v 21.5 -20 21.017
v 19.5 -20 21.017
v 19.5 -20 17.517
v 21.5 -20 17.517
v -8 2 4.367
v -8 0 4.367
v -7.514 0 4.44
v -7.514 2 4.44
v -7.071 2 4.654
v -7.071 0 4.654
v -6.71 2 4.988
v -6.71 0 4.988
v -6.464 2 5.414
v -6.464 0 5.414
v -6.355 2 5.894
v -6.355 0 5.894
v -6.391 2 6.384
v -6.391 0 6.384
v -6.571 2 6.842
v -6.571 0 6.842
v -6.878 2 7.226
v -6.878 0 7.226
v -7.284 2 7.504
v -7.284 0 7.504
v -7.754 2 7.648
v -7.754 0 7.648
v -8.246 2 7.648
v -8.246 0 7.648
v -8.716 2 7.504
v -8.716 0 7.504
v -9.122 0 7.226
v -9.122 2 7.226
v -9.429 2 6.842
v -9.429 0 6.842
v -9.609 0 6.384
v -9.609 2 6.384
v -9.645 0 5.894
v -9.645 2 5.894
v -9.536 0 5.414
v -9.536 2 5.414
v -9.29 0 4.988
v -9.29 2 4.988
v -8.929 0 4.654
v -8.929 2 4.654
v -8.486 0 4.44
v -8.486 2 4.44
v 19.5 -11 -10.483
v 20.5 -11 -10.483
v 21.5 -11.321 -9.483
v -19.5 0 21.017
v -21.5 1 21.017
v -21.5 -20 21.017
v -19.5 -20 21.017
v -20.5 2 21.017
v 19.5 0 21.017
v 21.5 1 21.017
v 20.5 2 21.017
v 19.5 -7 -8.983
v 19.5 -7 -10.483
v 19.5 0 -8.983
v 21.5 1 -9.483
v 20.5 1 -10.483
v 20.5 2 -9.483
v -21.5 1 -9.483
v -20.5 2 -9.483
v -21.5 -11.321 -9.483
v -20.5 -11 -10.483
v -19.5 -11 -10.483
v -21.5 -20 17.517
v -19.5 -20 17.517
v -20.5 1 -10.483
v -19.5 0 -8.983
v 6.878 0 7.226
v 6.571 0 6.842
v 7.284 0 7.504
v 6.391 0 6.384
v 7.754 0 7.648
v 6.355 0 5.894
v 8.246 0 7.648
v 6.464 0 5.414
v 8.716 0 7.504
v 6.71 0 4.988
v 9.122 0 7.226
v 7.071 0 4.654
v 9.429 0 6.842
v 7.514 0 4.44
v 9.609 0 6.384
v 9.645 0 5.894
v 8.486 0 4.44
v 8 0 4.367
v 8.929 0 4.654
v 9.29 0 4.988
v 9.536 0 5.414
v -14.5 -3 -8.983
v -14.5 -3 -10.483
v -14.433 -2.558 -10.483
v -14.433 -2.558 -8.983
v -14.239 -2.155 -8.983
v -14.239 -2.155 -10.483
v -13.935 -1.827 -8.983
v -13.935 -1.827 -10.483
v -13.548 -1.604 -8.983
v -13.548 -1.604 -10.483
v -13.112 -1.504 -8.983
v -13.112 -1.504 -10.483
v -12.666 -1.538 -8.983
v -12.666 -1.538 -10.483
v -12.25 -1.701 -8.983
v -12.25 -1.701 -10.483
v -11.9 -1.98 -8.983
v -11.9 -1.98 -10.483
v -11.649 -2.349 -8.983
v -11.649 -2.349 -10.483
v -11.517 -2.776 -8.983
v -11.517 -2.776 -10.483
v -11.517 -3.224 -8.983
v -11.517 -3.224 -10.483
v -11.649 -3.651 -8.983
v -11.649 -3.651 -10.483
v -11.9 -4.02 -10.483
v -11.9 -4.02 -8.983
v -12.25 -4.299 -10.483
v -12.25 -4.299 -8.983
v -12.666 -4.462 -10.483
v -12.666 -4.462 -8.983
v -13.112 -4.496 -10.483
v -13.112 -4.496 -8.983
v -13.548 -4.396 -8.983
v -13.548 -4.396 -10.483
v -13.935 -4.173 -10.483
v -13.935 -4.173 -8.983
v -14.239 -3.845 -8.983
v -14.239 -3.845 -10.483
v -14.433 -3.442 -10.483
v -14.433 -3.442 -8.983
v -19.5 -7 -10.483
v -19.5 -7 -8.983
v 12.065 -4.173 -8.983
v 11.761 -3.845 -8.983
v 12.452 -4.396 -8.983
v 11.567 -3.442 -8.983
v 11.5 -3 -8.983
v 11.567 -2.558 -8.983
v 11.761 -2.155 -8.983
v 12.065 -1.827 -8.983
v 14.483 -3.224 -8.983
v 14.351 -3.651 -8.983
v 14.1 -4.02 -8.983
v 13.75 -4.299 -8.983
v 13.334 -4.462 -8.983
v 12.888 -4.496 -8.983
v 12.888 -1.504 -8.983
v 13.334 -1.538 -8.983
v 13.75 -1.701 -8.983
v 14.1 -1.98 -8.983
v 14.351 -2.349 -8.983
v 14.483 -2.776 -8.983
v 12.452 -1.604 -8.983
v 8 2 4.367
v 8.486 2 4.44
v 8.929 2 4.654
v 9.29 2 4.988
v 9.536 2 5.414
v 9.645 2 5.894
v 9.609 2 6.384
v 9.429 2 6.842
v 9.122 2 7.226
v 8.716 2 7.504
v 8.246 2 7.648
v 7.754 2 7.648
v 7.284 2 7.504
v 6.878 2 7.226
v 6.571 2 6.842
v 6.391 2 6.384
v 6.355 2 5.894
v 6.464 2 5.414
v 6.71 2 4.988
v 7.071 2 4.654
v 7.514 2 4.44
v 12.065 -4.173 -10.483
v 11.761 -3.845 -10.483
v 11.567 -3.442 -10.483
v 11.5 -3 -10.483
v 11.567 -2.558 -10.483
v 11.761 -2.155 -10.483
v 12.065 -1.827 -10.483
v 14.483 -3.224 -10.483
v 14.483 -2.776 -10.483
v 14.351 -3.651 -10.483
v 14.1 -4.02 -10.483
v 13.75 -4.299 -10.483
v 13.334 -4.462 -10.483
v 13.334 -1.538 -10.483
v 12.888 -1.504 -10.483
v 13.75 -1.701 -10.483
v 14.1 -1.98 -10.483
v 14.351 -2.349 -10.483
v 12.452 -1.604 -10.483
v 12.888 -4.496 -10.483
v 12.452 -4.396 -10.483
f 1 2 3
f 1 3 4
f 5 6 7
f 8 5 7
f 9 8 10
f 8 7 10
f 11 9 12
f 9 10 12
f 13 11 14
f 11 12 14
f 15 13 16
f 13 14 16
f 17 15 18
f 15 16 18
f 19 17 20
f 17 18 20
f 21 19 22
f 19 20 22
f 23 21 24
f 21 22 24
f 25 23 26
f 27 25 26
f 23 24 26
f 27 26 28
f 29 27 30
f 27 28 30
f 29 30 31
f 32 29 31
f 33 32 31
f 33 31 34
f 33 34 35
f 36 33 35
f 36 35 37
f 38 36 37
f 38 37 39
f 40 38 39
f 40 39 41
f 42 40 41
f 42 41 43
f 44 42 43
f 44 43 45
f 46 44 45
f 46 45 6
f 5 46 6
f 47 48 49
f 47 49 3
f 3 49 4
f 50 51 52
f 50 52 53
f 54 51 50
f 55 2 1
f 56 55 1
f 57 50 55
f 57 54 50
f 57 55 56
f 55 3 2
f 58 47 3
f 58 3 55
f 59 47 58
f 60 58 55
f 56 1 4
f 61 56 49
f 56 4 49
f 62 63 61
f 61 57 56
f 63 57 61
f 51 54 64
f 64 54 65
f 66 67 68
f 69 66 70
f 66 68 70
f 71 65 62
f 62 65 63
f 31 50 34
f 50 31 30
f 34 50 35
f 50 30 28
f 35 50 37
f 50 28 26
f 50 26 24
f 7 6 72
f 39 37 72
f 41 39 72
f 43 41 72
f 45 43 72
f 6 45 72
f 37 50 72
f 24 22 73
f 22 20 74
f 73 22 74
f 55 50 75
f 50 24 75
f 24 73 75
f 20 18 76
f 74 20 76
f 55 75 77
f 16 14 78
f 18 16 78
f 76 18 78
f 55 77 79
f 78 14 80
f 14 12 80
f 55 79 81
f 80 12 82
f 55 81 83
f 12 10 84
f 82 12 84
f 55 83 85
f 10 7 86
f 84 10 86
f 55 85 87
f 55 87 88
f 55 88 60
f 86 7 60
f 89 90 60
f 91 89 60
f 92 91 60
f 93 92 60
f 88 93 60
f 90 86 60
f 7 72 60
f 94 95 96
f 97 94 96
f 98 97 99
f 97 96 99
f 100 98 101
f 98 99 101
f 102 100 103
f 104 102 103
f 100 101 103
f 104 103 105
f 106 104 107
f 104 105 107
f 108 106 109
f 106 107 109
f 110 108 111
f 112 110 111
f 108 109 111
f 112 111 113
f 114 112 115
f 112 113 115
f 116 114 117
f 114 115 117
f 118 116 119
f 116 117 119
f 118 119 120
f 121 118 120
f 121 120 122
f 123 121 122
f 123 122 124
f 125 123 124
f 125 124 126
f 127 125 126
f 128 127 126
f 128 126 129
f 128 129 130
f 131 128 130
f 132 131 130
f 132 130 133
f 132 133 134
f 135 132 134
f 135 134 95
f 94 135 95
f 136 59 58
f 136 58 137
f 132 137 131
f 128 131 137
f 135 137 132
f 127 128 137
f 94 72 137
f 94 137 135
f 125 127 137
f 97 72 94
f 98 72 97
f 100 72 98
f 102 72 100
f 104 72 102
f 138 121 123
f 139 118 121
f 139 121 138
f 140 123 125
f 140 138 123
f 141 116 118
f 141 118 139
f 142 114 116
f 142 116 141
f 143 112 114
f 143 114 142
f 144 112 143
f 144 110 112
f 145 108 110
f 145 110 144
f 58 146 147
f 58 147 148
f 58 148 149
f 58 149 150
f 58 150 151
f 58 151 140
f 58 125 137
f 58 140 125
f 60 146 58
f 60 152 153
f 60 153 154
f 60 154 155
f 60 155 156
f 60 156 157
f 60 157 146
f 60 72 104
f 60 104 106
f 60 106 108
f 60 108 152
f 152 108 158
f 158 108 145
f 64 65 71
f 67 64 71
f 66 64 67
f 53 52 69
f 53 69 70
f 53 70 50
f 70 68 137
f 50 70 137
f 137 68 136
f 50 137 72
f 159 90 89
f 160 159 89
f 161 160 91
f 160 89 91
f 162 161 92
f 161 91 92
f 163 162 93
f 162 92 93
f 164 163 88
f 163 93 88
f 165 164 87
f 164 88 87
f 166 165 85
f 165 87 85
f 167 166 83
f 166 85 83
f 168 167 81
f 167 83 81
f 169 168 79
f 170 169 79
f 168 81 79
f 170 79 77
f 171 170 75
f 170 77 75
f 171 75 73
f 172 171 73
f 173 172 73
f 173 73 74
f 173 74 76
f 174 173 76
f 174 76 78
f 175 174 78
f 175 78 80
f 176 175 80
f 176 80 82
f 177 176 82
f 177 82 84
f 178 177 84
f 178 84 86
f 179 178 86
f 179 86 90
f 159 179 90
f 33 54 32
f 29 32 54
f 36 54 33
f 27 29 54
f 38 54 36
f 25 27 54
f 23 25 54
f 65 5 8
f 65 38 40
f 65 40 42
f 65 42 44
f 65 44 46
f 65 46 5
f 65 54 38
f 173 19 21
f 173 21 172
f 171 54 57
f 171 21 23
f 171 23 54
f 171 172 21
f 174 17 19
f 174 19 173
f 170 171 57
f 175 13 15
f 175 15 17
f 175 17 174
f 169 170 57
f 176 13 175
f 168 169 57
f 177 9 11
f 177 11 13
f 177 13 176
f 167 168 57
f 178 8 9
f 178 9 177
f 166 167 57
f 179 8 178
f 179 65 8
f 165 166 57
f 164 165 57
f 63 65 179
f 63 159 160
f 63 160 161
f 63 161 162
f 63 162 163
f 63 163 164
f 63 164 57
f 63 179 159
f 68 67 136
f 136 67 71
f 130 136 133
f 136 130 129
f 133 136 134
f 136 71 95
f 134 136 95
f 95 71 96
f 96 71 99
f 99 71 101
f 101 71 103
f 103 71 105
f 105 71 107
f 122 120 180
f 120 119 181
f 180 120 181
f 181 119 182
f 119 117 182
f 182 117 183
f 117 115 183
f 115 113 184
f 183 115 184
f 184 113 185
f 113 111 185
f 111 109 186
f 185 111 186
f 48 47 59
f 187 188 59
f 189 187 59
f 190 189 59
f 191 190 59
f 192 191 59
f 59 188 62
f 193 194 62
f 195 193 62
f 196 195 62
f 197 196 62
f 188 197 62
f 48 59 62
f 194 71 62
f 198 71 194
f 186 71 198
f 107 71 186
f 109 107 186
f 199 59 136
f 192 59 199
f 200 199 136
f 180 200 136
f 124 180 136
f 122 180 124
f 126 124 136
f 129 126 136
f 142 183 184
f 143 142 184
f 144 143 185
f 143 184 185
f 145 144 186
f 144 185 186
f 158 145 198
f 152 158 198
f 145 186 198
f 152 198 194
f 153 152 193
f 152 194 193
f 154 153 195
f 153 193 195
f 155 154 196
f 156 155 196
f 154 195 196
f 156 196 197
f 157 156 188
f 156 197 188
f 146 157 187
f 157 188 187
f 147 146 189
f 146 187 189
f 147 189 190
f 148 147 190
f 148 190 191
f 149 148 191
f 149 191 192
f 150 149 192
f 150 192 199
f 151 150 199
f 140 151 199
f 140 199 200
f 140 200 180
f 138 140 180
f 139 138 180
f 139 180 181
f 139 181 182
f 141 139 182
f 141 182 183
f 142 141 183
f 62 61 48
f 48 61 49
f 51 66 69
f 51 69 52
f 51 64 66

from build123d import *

# Parameters (mm, degrees)
SKETCH_1_W          = 43
SKETCH_1_H          = 31.5
EXTRUDE_1_DEPTH     = 2
SKETCH_4_W          = 2
SKETCH_4_H          = 31.5
EXTRUDE_3_DEPTH     = 20
SKETCH_7_W          = 39
SKETCH_7_H          = 1.5
EXTRUDE_4_DEPTH     = 11
SKETCH_6_R          = 1.65
CUT_EXTRUDE_2_DEPTH = 12
SKETCH_5_R          = 1.5
CUT_EXTRUDE_1_DEPTH = 12
CHAMFER_1_SIZE      = 1
CUT_EXTRUDE_4_DEPTH = 50
SKETCH_13_W         = 39
SKETCH_13_H         = 4
CUT_EXTRUDE_8_DEPTH = 10


with BuildPart() as part:
    # 草图1 → 凸台-拉伸1 (new body)
    with BuildSketch(Plane(origin=(0, 0, 0), x_dir=(1, 0, 0), z_dir=(0, 1, 0))):
        with Locations((0, -5.266908213)):
            Rectangle(SKETCH_1_W, SKETCH_1_H)
    extrude(amount=EXTRUDE_1_DEPTH)

    # 草图4 → 凸台-拉伸3 (add)
    with BuildSketch(Plane.XZ):
        with Locations((-20.5, 5.266908213)):
            Rectangle(SKETCH_4_W, SKETCH_4_H)
        with Locations((20.5, 5.266908213)):
            Rectangle(SKETCH_4_W, SKETCH_4_H)
    extrude(amount=EXTRUDE_3_DEPTH)

    # 草图7 → 凸台-拉伸4 (add)
    with BuildSketch(Plane.XZ):
        with Locations((0, -9.733091787)):
            Rectangle(SKETCH_7_W, SKETCH_7_H)
    extrude(amount=EXTRUDE_4_DEPTH)

    # 草图6 → 切除-拉伸2 (cut)
    with BuildSketch(Plane.XZ):
        with Locations(Location((8, 6.016908213, 0), (0, 0, 270))):
            Circle(SKETCH_6_R)
        with Locations(Location((-8, 6.016908213, 0), (0, 0, 270))):
            Circle(SKETCH_6_R)
    extrude(amount=-CUT_EXTRUDE_2_DEPTH, mode=Mode.SUBTRACT)

    # 草图5 → 切除-拉伸1 (cut)
    with BuildSketch(Plane(origin=(0, 0, -10.483091787), x_dir=(-1, 0, 0), z_dir=(0, 0, -1))):
        with Locations((-13, -3)):
            Circle(SKETCH_5_R)
        with Locations((13, -3)):
            Circle(SKETCH_5_R)
    extrude(amount=-CUT_EXTRUDE_1_DEPTH, mode=Mode.SUBTRACT)

    # 倒角1
    chamfer_1_edges = [part.edges().sort_by_distance(p)[0] for p in [
        (21.5, 2, 5.266908213),
        (0, 2, -10.483091787),
        (-21.5, 2, 5.266908213),
        (-21.5, -9, -10.483091787),
        (21.5, -9, -10.483091787),
    ]]
    chamfer(chamfer_1_edges, length=CHAMFER_1_SIZE)

    # 草图10 → 切除-拉伸4 (cut, symmetric)
    with BuildSketch(Plane(origin=(-19.5, 0, 0), x_dir=(0, 0, -1), z_dir=(1, 0, 0))):
        Polygon((10.483091787, -20), (10.483091787, -11), (-17.516908213, -20), align=None)
    extrude(amount=CUT_EXTRUDE_4_DEPTH, both=True, mode=Mode.SUBTRACT)

    # 草图13 → 切除-拉伸8 (cut)
    with BuildSketch(Plane(origin=(0, 0, -10.483091787), x_dir=(-1, 0, 0), z_dir=(0, 0, -1))):
        with Locations((0, -9)):
            Rectangle(SKETCH_13_W, SKETCH_13_H)
    extrude(amount=-CUT_EXTRUDE_8_DEPTH, mode=Mode.SUBTRACT)


solid = part.part
